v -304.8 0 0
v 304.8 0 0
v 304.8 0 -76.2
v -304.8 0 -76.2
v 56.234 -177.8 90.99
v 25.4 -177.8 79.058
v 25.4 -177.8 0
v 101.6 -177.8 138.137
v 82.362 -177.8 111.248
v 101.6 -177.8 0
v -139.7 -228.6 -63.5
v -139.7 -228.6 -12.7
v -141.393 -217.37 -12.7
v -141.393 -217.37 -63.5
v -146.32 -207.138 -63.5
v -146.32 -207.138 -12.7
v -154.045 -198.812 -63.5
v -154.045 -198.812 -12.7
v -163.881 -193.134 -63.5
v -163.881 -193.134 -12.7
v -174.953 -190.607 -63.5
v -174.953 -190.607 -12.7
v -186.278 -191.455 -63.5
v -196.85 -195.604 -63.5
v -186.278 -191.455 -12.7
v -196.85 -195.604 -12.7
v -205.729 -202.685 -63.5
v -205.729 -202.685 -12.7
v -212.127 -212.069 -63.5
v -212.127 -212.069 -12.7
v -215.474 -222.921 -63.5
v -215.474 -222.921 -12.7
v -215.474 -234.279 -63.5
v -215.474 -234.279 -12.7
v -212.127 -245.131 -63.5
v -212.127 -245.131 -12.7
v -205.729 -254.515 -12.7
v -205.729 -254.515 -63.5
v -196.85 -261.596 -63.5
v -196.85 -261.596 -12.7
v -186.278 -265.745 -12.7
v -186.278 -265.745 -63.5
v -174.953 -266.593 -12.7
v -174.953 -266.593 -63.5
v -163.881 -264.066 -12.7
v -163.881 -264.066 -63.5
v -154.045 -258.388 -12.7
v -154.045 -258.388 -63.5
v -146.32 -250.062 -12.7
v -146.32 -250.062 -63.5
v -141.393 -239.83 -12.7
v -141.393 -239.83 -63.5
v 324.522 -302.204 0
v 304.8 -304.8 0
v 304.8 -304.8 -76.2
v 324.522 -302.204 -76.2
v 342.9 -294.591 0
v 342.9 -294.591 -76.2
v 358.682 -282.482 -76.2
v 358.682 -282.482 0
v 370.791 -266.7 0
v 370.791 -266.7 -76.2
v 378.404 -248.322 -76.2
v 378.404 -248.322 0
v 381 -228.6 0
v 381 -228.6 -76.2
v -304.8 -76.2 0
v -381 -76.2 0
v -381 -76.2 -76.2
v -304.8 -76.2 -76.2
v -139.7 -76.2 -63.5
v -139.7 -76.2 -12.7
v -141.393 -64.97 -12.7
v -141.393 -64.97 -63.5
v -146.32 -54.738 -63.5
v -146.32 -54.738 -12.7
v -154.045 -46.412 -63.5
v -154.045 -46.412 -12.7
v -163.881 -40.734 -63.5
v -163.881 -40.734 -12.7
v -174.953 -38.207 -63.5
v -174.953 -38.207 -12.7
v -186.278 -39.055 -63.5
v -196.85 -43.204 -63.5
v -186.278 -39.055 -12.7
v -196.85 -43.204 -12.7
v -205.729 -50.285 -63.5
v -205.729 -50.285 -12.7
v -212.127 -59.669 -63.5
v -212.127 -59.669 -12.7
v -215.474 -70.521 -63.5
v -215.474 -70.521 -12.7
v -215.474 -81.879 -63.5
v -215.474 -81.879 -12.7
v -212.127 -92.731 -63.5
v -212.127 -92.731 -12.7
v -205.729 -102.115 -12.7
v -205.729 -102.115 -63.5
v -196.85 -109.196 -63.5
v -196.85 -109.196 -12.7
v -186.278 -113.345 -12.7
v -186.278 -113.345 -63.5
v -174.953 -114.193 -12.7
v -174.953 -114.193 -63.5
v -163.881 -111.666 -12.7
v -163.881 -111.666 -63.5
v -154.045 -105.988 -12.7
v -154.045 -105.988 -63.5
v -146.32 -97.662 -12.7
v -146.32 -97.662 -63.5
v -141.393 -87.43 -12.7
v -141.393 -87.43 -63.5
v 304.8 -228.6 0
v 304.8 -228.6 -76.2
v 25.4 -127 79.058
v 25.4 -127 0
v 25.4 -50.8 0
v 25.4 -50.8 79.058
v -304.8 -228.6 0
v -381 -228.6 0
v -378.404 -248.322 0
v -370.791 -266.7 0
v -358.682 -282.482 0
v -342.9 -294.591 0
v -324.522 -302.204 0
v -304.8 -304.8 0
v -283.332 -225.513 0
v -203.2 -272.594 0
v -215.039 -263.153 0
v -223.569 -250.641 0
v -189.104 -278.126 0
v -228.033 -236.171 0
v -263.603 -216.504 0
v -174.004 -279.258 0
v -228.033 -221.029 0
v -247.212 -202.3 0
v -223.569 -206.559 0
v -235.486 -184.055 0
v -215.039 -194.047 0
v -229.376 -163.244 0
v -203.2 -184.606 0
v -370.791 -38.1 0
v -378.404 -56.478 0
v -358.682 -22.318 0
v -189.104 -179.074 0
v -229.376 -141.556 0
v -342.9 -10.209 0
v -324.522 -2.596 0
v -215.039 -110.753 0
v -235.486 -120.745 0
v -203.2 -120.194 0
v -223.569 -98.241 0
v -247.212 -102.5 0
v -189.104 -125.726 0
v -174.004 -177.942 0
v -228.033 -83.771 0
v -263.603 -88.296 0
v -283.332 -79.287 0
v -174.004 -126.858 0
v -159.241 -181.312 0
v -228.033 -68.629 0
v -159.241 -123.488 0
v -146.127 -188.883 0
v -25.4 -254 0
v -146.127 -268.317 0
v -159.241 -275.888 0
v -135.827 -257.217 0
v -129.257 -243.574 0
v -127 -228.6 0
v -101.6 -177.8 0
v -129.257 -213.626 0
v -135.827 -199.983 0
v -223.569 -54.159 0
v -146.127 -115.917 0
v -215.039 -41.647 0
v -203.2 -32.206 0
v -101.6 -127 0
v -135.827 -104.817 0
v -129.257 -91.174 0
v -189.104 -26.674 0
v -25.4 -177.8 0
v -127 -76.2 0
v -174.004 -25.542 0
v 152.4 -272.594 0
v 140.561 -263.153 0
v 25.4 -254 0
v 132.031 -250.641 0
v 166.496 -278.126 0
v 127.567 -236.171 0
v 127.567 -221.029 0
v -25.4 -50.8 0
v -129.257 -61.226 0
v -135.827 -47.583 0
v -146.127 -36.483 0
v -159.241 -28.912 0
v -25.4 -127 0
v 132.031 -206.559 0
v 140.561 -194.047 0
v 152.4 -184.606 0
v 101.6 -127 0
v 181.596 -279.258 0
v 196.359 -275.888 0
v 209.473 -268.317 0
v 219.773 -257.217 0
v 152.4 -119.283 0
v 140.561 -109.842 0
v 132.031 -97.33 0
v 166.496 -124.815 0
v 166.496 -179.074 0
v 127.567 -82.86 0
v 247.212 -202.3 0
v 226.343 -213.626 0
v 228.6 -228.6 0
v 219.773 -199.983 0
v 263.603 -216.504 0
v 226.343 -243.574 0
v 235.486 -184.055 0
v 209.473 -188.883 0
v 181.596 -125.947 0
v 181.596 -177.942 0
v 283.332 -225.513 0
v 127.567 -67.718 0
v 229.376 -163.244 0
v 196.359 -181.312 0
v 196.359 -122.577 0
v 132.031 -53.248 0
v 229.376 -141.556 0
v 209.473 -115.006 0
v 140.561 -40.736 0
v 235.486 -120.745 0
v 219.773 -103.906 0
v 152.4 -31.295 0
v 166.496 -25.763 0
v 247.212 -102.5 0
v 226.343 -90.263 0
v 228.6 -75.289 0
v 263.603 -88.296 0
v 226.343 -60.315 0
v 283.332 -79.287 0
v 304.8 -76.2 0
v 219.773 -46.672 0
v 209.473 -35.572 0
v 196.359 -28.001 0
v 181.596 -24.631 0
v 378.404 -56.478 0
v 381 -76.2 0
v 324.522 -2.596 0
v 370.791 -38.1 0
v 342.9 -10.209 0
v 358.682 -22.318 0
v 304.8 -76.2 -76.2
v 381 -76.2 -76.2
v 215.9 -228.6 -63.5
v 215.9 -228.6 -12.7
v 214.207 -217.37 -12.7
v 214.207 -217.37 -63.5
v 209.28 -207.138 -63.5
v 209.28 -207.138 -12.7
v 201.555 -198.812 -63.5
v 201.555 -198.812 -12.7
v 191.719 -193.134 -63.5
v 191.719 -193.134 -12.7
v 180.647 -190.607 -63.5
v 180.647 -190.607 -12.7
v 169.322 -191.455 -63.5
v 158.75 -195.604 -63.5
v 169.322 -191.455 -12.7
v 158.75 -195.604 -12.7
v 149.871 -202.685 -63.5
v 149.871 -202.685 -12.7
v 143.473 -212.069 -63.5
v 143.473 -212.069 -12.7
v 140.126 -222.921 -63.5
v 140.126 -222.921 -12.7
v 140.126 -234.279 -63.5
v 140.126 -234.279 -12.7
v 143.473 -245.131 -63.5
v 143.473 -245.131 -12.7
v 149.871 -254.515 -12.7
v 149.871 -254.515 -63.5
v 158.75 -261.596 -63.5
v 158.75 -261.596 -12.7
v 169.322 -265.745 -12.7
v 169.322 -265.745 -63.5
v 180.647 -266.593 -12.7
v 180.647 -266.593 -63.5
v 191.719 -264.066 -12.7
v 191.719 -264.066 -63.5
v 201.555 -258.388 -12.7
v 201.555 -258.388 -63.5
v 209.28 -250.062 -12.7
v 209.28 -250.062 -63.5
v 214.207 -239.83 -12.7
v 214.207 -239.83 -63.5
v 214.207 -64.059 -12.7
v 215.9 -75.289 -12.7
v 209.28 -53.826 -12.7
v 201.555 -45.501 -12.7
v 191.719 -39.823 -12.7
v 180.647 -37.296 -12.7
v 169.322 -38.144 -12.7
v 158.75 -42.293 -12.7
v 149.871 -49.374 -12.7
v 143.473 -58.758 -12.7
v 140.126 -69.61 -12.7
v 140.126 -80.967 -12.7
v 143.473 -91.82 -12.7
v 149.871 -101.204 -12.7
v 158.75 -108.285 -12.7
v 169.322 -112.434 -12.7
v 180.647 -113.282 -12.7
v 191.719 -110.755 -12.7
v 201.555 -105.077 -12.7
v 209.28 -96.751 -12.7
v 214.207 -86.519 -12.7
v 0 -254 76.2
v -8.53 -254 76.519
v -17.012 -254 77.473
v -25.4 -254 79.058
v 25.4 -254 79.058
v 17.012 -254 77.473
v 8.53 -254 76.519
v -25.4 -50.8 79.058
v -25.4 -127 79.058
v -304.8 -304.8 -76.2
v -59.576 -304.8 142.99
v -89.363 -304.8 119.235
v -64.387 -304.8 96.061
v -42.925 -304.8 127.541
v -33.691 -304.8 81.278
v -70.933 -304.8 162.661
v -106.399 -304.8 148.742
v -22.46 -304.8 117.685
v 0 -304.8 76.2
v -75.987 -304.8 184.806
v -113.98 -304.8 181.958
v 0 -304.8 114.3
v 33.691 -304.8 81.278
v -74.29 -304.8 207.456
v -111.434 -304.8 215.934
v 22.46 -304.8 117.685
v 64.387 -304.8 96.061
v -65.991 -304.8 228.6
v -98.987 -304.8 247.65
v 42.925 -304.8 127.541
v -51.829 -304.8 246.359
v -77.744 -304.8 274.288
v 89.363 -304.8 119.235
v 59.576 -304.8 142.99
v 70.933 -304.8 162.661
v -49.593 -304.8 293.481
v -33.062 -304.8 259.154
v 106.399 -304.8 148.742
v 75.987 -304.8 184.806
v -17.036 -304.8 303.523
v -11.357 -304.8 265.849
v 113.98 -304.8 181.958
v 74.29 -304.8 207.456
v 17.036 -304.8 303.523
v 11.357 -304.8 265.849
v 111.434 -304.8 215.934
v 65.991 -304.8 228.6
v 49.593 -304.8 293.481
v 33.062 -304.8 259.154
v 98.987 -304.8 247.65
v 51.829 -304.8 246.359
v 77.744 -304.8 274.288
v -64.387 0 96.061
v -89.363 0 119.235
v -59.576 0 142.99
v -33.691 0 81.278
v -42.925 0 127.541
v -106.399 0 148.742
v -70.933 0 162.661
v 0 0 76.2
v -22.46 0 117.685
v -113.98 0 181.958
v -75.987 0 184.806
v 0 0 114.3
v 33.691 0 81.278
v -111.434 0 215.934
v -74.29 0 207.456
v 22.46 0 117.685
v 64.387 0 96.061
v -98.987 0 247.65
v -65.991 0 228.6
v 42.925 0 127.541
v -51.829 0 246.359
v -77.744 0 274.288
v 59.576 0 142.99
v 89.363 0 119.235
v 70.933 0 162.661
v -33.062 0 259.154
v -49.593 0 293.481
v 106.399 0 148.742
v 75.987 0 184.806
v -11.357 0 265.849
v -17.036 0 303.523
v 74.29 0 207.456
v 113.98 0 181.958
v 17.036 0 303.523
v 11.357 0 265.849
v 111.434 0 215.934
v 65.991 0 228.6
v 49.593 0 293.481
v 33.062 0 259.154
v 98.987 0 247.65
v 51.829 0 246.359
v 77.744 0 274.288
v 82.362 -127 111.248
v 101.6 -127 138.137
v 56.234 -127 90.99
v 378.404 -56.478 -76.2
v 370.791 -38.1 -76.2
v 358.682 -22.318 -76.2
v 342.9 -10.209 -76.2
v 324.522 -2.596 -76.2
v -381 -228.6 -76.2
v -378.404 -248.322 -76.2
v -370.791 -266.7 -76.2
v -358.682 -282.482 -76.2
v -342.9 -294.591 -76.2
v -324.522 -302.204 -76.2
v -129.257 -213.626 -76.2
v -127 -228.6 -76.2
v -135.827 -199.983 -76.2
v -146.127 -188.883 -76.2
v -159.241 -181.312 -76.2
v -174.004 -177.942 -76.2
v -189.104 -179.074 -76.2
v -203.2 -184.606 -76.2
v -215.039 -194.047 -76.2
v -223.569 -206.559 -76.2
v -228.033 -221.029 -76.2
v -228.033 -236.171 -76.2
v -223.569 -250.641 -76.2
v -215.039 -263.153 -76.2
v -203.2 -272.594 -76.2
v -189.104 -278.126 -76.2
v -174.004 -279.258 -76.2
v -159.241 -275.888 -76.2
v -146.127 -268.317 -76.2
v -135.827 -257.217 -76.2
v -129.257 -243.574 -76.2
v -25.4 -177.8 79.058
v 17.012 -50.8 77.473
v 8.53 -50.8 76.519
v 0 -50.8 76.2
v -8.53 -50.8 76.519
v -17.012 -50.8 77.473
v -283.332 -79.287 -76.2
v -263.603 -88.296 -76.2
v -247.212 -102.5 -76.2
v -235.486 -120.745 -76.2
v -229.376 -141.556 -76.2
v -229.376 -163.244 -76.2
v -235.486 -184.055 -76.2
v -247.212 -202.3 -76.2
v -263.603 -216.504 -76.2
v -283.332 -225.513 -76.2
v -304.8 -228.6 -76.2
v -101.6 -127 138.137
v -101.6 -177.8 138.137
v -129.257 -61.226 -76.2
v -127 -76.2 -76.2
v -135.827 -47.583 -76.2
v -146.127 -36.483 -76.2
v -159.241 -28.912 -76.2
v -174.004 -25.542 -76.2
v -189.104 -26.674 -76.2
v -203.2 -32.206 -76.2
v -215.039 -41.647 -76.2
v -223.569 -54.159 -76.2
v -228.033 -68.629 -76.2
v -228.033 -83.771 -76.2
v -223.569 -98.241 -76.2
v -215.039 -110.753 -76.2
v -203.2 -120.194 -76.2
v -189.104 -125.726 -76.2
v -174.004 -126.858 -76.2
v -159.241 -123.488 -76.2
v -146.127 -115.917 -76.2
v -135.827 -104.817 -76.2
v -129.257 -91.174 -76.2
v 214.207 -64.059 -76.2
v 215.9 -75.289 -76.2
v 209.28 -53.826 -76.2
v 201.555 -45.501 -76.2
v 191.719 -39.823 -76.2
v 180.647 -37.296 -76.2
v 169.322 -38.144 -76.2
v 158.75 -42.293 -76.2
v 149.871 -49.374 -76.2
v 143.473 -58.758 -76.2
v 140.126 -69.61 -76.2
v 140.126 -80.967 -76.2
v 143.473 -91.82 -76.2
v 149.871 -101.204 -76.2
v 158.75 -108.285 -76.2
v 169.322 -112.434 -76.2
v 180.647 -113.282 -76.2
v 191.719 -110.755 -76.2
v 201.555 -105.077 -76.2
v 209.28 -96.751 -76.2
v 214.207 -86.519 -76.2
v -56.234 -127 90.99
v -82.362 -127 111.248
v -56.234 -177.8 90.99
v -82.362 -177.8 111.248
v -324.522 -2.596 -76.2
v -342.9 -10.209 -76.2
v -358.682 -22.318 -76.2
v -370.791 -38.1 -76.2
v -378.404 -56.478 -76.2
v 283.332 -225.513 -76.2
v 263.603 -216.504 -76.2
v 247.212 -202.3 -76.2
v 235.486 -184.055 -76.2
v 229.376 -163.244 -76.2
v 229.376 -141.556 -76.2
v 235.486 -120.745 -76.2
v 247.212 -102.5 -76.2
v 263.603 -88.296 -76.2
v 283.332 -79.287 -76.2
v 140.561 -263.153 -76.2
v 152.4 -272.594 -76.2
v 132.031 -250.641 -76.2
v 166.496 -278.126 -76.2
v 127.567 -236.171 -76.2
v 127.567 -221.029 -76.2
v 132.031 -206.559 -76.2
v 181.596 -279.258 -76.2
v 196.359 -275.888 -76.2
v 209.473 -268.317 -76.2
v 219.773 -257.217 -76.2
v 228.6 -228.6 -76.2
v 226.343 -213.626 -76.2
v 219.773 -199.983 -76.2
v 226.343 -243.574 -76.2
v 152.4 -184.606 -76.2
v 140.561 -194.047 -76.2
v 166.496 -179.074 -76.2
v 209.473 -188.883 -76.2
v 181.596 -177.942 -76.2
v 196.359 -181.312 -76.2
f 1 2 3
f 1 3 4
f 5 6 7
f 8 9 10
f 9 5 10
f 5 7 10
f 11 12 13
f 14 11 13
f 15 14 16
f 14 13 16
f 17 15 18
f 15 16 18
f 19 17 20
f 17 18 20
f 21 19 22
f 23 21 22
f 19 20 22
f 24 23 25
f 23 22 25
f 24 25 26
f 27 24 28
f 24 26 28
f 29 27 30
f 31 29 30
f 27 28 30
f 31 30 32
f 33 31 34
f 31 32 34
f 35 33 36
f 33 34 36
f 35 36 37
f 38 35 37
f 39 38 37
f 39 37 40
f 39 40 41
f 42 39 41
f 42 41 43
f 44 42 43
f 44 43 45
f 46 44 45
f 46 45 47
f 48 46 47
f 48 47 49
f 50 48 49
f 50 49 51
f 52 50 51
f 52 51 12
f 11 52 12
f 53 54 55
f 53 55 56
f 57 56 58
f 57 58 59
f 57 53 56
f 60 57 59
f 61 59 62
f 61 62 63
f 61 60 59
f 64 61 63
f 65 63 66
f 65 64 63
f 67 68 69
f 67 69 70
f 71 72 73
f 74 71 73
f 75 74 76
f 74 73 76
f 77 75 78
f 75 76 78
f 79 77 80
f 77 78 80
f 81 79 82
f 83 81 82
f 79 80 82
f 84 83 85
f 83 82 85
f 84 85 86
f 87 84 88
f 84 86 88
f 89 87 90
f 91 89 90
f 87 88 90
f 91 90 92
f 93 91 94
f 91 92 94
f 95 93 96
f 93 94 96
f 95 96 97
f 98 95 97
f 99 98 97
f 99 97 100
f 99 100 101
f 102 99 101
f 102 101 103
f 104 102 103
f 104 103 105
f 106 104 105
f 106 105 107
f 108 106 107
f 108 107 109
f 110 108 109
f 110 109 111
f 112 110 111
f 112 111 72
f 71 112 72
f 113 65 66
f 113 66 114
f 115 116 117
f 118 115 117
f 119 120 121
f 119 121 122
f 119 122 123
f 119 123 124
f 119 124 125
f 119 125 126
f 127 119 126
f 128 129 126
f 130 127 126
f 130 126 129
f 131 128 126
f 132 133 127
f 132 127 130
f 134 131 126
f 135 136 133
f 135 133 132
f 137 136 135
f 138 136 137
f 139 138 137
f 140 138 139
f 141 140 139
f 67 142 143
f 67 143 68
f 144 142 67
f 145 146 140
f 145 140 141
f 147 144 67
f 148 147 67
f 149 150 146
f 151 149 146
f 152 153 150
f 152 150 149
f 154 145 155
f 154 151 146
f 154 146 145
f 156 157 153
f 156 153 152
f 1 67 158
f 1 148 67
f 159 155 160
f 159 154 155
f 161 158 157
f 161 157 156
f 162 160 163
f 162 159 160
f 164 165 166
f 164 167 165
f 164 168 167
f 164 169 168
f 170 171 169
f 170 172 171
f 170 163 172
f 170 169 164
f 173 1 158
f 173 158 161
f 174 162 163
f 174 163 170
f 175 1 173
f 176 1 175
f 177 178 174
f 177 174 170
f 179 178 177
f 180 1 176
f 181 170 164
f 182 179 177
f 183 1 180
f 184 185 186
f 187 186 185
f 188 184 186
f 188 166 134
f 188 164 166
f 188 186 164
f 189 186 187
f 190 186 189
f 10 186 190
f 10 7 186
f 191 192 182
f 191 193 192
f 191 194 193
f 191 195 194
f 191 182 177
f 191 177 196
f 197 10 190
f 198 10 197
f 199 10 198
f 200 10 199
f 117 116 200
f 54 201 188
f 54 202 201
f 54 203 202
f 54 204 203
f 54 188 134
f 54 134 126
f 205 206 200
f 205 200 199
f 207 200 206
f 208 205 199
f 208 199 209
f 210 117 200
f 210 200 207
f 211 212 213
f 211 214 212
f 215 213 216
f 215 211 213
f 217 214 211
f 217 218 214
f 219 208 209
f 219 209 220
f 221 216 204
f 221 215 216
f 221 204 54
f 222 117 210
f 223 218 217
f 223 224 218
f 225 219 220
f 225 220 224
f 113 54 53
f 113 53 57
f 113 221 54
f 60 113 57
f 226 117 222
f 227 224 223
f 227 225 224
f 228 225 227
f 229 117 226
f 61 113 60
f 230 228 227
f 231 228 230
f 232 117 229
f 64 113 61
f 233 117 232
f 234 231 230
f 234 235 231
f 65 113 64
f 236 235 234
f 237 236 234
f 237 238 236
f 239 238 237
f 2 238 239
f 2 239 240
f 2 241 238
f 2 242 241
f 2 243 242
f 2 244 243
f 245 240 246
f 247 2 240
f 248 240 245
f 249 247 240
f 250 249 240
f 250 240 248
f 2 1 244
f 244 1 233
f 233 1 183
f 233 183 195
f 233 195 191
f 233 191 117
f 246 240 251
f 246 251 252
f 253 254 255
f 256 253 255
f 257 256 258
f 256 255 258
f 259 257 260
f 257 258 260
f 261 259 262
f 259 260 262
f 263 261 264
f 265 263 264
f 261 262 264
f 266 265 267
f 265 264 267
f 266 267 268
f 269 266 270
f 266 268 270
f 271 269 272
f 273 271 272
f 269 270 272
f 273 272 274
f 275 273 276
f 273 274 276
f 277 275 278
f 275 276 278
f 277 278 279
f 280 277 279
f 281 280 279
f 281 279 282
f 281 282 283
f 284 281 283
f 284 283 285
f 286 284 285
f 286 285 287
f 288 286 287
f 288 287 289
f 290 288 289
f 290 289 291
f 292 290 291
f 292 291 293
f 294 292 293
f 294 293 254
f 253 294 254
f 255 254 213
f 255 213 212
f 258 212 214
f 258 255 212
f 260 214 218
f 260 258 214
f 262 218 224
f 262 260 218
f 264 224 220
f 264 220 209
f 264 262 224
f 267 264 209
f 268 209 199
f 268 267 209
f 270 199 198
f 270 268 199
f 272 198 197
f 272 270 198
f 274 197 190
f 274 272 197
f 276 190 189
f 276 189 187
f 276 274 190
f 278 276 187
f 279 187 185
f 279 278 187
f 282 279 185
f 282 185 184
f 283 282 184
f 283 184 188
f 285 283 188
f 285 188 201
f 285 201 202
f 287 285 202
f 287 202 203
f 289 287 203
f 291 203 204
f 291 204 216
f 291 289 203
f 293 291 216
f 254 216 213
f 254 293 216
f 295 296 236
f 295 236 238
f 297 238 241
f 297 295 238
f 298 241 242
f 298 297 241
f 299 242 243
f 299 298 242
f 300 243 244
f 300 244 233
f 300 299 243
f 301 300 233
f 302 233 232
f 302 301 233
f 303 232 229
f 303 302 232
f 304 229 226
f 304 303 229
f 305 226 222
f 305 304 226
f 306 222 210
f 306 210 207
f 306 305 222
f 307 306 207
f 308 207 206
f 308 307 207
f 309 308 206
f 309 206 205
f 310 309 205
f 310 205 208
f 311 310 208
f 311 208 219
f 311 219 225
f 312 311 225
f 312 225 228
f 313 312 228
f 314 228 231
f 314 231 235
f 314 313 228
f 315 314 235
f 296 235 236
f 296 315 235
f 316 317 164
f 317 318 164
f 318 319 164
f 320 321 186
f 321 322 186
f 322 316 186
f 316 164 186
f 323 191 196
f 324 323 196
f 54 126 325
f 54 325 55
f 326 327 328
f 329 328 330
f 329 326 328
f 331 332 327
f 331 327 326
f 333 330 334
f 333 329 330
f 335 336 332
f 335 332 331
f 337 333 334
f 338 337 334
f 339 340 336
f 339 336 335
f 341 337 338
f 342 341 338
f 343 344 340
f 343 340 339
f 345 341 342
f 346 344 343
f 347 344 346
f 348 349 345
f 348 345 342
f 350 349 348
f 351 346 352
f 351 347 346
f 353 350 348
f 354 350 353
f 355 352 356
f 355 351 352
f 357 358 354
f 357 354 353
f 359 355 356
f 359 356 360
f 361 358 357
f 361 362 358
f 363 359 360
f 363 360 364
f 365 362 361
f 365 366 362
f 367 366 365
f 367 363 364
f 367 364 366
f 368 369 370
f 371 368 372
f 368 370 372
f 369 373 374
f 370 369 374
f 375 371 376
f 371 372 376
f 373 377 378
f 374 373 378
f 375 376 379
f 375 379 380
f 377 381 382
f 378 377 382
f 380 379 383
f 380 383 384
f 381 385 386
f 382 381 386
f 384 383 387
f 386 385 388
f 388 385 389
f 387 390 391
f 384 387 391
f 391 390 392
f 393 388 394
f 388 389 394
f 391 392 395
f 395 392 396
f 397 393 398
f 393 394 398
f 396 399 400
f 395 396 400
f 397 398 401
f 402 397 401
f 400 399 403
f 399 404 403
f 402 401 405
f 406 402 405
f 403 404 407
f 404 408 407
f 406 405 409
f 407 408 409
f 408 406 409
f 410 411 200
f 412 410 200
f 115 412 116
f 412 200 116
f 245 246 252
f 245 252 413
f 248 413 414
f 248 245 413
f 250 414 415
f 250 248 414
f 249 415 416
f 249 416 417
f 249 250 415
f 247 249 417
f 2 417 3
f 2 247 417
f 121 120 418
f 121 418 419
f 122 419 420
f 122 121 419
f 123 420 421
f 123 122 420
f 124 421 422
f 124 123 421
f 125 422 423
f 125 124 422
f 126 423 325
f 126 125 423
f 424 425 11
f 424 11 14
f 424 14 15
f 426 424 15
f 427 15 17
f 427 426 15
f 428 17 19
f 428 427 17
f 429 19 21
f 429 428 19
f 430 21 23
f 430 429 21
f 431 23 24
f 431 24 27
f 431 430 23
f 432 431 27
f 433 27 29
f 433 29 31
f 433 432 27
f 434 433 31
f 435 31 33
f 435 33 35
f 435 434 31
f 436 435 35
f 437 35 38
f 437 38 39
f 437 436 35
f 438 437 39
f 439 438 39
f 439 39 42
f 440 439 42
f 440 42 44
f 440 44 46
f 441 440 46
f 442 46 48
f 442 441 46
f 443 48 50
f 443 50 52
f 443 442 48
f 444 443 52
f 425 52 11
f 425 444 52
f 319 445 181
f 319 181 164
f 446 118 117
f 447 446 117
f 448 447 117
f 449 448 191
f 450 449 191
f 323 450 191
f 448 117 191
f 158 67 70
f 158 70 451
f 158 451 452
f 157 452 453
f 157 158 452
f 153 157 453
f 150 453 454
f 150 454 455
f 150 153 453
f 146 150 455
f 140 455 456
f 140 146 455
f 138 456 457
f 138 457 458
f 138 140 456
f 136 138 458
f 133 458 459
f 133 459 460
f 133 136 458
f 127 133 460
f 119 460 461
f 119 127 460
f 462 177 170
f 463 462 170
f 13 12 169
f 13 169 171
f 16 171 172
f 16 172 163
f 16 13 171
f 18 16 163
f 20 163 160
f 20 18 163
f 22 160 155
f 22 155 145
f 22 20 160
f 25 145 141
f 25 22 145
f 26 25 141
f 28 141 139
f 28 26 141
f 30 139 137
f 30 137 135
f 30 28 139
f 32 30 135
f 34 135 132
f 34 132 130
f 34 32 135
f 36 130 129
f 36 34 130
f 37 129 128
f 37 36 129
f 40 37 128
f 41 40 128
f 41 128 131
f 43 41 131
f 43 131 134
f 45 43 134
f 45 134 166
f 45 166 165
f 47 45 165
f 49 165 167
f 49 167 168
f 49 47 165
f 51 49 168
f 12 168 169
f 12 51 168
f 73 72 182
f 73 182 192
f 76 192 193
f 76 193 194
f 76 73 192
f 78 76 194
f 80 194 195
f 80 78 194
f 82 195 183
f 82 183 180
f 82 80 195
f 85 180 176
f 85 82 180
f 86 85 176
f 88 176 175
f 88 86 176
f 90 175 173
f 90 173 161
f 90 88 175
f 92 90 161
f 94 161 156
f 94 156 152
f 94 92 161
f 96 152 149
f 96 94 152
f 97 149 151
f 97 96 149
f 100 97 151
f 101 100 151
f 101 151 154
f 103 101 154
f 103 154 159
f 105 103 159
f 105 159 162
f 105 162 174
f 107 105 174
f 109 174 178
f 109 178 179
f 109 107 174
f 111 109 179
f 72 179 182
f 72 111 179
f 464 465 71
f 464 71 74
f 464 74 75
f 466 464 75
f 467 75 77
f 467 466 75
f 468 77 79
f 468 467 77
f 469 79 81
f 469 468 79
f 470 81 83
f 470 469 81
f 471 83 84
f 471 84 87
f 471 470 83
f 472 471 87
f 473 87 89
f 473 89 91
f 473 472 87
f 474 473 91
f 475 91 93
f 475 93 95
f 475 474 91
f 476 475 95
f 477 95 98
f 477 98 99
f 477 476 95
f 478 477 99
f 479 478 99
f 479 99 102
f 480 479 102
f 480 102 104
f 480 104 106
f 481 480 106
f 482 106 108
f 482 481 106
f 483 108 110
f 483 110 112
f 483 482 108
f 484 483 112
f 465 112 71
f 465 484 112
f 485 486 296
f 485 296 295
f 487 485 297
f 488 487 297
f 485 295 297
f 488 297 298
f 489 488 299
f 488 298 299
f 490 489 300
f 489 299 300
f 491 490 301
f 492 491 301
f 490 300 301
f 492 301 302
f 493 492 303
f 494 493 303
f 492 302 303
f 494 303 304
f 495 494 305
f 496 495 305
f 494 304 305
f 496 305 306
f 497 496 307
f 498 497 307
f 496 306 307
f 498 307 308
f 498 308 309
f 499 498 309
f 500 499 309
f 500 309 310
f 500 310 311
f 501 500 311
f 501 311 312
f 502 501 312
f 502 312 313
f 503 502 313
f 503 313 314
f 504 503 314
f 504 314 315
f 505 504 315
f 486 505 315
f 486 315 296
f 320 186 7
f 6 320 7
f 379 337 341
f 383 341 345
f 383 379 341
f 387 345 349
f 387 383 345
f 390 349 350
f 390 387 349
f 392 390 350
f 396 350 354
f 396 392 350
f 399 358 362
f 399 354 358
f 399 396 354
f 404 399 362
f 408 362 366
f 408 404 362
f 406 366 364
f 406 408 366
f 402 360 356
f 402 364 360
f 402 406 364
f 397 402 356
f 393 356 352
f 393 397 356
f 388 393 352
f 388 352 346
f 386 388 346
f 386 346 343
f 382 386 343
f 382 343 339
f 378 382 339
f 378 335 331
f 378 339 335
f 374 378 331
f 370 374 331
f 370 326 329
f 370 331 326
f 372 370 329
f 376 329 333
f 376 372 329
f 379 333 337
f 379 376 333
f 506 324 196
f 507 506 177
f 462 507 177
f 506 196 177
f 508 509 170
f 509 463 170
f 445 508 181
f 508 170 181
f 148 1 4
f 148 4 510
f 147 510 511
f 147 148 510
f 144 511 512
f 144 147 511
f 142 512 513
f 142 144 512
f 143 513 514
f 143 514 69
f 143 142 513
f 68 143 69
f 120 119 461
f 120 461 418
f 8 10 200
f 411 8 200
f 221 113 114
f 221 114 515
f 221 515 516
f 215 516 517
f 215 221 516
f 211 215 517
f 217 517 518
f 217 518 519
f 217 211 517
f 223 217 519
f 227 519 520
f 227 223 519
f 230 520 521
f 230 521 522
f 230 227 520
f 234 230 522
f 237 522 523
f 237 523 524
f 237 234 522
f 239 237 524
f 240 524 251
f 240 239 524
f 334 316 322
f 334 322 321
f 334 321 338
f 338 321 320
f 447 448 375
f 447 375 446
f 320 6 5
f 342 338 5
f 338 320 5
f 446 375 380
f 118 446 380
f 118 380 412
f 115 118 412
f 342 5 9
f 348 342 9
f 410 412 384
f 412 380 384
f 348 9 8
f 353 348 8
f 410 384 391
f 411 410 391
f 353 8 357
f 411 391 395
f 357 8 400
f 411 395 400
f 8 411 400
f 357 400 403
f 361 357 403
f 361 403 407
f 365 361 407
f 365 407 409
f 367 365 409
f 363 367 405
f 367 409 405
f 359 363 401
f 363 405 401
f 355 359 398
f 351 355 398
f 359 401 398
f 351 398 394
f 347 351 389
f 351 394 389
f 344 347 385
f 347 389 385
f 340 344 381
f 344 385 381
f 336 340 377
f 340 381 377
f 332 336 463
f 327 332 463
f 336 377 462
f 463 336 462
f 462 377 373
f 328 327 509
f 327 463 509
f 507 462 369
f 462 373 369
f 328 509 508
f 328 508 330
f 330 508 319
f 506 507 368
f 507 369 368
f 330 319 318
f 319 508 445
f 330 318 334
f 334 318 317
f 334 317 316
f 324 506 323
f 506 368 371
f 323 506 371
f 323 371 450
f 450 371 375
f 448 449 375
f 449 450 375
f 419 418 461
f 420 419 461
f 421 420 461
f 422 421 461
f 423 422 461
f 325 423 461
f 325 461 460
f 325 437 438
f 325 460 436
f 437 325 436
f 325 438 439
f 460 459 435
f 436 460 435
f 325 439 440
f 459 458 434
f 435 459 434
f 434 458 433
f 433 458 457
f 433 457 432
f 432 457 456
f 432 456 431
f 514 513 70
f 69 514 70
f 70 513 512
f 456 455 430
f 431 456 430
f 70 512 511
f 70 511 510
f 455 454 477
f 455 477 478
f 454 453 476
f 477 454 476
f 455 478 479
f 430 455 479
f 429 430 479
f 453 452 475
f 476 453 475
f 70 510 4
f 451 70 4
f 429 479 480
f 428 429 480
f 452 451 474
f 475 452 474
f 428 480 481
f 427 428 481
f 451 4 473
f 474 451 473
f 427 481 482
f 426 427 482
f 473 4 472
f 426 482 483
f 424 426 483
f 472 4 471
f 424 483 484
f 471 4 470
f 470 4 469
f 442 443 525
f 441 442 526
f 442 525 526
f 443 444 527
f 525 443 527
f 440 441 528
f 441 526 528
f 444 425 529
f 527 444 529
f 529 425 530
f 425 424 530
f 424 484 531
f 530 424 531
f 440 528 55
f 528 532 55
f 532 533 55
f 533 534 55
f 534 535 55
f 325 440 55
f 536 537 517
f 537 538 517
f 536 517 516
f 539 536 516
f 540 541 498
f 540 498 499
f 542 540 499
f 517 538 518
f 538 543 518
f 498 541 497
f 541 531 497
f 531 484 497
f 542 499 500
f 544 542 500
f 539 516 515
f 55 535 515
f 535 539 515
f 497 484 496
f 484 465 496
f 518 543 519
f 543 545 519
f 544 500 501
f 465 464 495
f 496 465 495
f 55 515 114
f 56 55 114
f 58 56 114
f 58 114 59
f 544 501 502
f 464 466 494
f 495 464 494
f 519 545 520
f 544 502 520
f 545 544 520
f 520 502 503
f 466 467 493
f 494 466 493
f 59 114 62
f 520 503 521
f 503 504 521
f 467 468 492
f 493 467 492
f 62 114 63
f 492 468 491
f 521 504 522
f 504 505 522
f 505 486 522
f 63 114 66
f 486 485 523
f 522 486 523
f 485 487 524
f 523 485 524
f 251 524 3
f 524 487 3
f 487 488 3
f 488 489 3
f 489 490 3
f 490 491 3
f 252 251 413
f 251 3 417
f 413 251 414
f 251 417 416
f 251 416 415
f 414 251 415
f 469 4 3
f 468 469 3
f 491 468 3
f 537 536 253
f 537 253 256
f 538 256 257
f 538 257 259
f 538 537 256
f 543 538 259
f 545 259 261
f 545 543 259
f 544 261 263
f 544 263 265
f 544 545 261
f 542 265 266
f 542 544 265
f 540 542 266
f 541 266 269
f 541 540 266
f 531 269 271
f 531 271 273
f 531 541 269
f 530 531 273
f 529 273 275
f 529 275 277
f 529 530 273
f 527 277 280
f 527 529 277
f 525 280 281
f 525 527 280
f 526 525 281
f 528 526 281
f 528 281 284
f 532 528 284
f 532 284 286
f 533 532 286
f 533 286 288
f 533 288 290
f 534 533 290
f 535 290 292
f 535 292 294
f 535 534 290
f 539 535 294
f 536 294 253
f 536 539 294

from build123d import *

# Parameters (mm, degrees)
F0_R     = 38.1
F1_DEPTH = 76.2
F3_DEPTH = 175.006
F5_DEPTH = 304.8
F6_DEPTH = 430.022
F7_DEPTH = 172.72
F8_SIZE  = 12.7


with BuildPart() as f1:
    # F0 (on Top) → F1 (new body)
    with BuildSketch(Plane.XY):
        with BuildLine():
            Line((304.8000000003, 0), (-304.8000000003, 0))
            ThreePointArc((-304.8000000003, 0), (-358.6815367265, -22.3184632735), (-381, -76.1999999997))
            Line((-381, -76.1999999997), (-304.8000000003, -76.1999999997))
            ThreePointArc((-304.8000000003, -76.1999999997), (-228.6, -152.4), (-304.8000000003, -228.6000000003))
            Line((-304.8000000003, -228.6000000003), (-381, -228.6000000003))
            ThreePointArc((-381, -228.6000000003), (-358.6815367265, -282.4815367265), (-304.8000000003, -304.8))
            Line((-304.8000000003, -304.8), (304.8000000003, -304.8))
            ThreePointArc((304.8000000003, -304.8), (358.6815367267, -282.4815367264), (381.0000000003, -228.6))
            Line((381, -228.6000000003), (304.8000000003, -228.6000000003))
            ThreePointArc((304.8000000003, -228.6000000003), (228.6, -152.4), (304.8000000003, -76.1999999997))
            Line((304.8000000003, -76.1999999997), (381, -76.1999999997))
            ThreePointArc((381.0000000005, -76.2000000003), (358.6815367269, -22.3184632737), (304.8000000003, 0))
        make_face()
        with Locations((-177.8, -228.6)):
            Circle(F0_R, mode=Mode.SUBTRACT)
        with Locations((177.8, -228.6)):
            Circle(F0_R, mode=Mode.SUBTRACT)
        Polygon((-25.4, -114.8846255064), (-25.4, -48.2938652754), (25.4, -48.2938652754), (25.4, -114.8846255064), (101.6, -114.8846255064), (101.6, -165.6846255064), (25.4, -165.6846255064), (25.4, -241.8846255064), (-25.4, -241.8846255064), (-25.4, -165.6846255064), (-101.6, -165.6846255064), (-101.6, -114.8846255064), align=None, mode=Mode.SUBTRACT)
        with Locations((-177.7999999997, -76.2)):
            Circle(F0_R, mode=Mode.SUBTRACT)
        with Locations((177.8, -75.2889811993)):
            Circle(F0_R, mode=Mode.SUBTRACT)
        with Locations((-177.7999999997, -76.2)):
            Circle(F0_R)
        Polygon((25.4, -48.2938652754), (-25.4, -48.2938652754), (-25.4, -114.8846255064), (-101.6, -114.8846255064), (-101.6, -165.6846255064), (-25.4, -165.6846255064), (-25.4, -241.8846255064), (25.4, -241.8846255064), (25.4, -165.6846255064), (101.6, -165.6846255064), (101.6, -114.8846255064), (25.4, -114.8846255064), align=None)
        with Locations((177.8, -75.2889811993)):
            Circle(F0_R)
        with Locations((177.8, -228.6)):
            Circle(F0_R)
        with Locations((-177.8, -228.6)):
            Circle(F0_R)
    extrude(amount=-F1_DEPTH)

    # F2 (on Top) → F3 (join)
    with BuildSketch(Plane.XY):
        Polygon((25.4, -50.8), (-25.4, -50.8), (-25.4, -127), (-101.6, -127), (-101.6, -177.8), (-25.4, -177.8), (-25.4, -254), (25.4, -254), (25.4, -177.8), (101.6, -177.8), (101.6, -127), (25.4, -127), align=None)
    extrude(amount=F3_DEPTH)

    # F4 (on Front) → F5 (join)
    with BuildSketch(Plane.XZ):
        with BuildLine():
            ThreePointArc((114.3, 190.5), (-80.8223050896, 271.3223050896), (0, 76.2))
            ThreePointArc((0, 76.2), (80.8223050896, 109.6776949104), (114.3, 190.5))
        make_face()
        with BuildLine():
            ThreePointArc((76.2, 190.5), (53.8815367264, 136.6184632736), (0, 114.3))
            ThreePointArc((0, 114.3), (-53.8815367264, 244.3815367264), (76.2, 190.5))
        make_face(mode=Mode.SUBTRACT)
        with BuildLine():
            ThreePointArc((76.2, 190.5), (-53.8815367264, 244.3815367264), (0, 114.3))
            ThreePointArc((0, 114.3), (53.8815367264, 136.6184632736), (76.2, 190.5))
        make_face()
    extrude(amount=F5_DEPTH)

    # F4 (on Front) → F6 (cut)
    with BuildSketch(Plane.XZ):
        with BuildLine():
            ThreePointArc((76.2, 190.5), (-53.8815367264, 244.3815367264), (0, 114.3))
            ThreePointArc((0, 114.3), (53.8815367264, 136.6184632736), (76.2, 190.5))
        make_face()
    extrude(amount=F6_DEPTH, mode=Mode.SUBTRACT)

    # F0 (on Top) → F7 (cut)
    with BuildSketch(Plane.XY):
        with Locations((-177.7999999997, -76.2)):
            Circle(F0_R)
        with Locations((-177.8, -228.6)):
            Circle(F0_R)
        with Locations((177.8, -75.2889811993)):
            Circle(F0_R)
        with Locations((177.8, -228.6)):
            Circle(F0_R)
    extrude(amount=-F7_DEPTH, mode=Mode.SUBTRACT)

    # F8
    f8_edges = [f1.edges().sort_by_distance(p)[0] for p in [
        (139.7, -75.288981, 0),
        (139.7, -228.6, 0),
        (215.9, -228.6, -38.1),
        (139.7, -228.6, -76.2),
        (-215.9, -228.6, 0),
        (-139.7, -228.6, -38.1),
        (-215.9, -228.6, -76.2),
        (-215.9, -76.2, 0),
        (-139.7, -76.2, -38.1),
        (-215.9, -76.2, -76.2),
    ]]
    chamfer(f8_edges, length=F8_SIZE)


solid = f1.part
